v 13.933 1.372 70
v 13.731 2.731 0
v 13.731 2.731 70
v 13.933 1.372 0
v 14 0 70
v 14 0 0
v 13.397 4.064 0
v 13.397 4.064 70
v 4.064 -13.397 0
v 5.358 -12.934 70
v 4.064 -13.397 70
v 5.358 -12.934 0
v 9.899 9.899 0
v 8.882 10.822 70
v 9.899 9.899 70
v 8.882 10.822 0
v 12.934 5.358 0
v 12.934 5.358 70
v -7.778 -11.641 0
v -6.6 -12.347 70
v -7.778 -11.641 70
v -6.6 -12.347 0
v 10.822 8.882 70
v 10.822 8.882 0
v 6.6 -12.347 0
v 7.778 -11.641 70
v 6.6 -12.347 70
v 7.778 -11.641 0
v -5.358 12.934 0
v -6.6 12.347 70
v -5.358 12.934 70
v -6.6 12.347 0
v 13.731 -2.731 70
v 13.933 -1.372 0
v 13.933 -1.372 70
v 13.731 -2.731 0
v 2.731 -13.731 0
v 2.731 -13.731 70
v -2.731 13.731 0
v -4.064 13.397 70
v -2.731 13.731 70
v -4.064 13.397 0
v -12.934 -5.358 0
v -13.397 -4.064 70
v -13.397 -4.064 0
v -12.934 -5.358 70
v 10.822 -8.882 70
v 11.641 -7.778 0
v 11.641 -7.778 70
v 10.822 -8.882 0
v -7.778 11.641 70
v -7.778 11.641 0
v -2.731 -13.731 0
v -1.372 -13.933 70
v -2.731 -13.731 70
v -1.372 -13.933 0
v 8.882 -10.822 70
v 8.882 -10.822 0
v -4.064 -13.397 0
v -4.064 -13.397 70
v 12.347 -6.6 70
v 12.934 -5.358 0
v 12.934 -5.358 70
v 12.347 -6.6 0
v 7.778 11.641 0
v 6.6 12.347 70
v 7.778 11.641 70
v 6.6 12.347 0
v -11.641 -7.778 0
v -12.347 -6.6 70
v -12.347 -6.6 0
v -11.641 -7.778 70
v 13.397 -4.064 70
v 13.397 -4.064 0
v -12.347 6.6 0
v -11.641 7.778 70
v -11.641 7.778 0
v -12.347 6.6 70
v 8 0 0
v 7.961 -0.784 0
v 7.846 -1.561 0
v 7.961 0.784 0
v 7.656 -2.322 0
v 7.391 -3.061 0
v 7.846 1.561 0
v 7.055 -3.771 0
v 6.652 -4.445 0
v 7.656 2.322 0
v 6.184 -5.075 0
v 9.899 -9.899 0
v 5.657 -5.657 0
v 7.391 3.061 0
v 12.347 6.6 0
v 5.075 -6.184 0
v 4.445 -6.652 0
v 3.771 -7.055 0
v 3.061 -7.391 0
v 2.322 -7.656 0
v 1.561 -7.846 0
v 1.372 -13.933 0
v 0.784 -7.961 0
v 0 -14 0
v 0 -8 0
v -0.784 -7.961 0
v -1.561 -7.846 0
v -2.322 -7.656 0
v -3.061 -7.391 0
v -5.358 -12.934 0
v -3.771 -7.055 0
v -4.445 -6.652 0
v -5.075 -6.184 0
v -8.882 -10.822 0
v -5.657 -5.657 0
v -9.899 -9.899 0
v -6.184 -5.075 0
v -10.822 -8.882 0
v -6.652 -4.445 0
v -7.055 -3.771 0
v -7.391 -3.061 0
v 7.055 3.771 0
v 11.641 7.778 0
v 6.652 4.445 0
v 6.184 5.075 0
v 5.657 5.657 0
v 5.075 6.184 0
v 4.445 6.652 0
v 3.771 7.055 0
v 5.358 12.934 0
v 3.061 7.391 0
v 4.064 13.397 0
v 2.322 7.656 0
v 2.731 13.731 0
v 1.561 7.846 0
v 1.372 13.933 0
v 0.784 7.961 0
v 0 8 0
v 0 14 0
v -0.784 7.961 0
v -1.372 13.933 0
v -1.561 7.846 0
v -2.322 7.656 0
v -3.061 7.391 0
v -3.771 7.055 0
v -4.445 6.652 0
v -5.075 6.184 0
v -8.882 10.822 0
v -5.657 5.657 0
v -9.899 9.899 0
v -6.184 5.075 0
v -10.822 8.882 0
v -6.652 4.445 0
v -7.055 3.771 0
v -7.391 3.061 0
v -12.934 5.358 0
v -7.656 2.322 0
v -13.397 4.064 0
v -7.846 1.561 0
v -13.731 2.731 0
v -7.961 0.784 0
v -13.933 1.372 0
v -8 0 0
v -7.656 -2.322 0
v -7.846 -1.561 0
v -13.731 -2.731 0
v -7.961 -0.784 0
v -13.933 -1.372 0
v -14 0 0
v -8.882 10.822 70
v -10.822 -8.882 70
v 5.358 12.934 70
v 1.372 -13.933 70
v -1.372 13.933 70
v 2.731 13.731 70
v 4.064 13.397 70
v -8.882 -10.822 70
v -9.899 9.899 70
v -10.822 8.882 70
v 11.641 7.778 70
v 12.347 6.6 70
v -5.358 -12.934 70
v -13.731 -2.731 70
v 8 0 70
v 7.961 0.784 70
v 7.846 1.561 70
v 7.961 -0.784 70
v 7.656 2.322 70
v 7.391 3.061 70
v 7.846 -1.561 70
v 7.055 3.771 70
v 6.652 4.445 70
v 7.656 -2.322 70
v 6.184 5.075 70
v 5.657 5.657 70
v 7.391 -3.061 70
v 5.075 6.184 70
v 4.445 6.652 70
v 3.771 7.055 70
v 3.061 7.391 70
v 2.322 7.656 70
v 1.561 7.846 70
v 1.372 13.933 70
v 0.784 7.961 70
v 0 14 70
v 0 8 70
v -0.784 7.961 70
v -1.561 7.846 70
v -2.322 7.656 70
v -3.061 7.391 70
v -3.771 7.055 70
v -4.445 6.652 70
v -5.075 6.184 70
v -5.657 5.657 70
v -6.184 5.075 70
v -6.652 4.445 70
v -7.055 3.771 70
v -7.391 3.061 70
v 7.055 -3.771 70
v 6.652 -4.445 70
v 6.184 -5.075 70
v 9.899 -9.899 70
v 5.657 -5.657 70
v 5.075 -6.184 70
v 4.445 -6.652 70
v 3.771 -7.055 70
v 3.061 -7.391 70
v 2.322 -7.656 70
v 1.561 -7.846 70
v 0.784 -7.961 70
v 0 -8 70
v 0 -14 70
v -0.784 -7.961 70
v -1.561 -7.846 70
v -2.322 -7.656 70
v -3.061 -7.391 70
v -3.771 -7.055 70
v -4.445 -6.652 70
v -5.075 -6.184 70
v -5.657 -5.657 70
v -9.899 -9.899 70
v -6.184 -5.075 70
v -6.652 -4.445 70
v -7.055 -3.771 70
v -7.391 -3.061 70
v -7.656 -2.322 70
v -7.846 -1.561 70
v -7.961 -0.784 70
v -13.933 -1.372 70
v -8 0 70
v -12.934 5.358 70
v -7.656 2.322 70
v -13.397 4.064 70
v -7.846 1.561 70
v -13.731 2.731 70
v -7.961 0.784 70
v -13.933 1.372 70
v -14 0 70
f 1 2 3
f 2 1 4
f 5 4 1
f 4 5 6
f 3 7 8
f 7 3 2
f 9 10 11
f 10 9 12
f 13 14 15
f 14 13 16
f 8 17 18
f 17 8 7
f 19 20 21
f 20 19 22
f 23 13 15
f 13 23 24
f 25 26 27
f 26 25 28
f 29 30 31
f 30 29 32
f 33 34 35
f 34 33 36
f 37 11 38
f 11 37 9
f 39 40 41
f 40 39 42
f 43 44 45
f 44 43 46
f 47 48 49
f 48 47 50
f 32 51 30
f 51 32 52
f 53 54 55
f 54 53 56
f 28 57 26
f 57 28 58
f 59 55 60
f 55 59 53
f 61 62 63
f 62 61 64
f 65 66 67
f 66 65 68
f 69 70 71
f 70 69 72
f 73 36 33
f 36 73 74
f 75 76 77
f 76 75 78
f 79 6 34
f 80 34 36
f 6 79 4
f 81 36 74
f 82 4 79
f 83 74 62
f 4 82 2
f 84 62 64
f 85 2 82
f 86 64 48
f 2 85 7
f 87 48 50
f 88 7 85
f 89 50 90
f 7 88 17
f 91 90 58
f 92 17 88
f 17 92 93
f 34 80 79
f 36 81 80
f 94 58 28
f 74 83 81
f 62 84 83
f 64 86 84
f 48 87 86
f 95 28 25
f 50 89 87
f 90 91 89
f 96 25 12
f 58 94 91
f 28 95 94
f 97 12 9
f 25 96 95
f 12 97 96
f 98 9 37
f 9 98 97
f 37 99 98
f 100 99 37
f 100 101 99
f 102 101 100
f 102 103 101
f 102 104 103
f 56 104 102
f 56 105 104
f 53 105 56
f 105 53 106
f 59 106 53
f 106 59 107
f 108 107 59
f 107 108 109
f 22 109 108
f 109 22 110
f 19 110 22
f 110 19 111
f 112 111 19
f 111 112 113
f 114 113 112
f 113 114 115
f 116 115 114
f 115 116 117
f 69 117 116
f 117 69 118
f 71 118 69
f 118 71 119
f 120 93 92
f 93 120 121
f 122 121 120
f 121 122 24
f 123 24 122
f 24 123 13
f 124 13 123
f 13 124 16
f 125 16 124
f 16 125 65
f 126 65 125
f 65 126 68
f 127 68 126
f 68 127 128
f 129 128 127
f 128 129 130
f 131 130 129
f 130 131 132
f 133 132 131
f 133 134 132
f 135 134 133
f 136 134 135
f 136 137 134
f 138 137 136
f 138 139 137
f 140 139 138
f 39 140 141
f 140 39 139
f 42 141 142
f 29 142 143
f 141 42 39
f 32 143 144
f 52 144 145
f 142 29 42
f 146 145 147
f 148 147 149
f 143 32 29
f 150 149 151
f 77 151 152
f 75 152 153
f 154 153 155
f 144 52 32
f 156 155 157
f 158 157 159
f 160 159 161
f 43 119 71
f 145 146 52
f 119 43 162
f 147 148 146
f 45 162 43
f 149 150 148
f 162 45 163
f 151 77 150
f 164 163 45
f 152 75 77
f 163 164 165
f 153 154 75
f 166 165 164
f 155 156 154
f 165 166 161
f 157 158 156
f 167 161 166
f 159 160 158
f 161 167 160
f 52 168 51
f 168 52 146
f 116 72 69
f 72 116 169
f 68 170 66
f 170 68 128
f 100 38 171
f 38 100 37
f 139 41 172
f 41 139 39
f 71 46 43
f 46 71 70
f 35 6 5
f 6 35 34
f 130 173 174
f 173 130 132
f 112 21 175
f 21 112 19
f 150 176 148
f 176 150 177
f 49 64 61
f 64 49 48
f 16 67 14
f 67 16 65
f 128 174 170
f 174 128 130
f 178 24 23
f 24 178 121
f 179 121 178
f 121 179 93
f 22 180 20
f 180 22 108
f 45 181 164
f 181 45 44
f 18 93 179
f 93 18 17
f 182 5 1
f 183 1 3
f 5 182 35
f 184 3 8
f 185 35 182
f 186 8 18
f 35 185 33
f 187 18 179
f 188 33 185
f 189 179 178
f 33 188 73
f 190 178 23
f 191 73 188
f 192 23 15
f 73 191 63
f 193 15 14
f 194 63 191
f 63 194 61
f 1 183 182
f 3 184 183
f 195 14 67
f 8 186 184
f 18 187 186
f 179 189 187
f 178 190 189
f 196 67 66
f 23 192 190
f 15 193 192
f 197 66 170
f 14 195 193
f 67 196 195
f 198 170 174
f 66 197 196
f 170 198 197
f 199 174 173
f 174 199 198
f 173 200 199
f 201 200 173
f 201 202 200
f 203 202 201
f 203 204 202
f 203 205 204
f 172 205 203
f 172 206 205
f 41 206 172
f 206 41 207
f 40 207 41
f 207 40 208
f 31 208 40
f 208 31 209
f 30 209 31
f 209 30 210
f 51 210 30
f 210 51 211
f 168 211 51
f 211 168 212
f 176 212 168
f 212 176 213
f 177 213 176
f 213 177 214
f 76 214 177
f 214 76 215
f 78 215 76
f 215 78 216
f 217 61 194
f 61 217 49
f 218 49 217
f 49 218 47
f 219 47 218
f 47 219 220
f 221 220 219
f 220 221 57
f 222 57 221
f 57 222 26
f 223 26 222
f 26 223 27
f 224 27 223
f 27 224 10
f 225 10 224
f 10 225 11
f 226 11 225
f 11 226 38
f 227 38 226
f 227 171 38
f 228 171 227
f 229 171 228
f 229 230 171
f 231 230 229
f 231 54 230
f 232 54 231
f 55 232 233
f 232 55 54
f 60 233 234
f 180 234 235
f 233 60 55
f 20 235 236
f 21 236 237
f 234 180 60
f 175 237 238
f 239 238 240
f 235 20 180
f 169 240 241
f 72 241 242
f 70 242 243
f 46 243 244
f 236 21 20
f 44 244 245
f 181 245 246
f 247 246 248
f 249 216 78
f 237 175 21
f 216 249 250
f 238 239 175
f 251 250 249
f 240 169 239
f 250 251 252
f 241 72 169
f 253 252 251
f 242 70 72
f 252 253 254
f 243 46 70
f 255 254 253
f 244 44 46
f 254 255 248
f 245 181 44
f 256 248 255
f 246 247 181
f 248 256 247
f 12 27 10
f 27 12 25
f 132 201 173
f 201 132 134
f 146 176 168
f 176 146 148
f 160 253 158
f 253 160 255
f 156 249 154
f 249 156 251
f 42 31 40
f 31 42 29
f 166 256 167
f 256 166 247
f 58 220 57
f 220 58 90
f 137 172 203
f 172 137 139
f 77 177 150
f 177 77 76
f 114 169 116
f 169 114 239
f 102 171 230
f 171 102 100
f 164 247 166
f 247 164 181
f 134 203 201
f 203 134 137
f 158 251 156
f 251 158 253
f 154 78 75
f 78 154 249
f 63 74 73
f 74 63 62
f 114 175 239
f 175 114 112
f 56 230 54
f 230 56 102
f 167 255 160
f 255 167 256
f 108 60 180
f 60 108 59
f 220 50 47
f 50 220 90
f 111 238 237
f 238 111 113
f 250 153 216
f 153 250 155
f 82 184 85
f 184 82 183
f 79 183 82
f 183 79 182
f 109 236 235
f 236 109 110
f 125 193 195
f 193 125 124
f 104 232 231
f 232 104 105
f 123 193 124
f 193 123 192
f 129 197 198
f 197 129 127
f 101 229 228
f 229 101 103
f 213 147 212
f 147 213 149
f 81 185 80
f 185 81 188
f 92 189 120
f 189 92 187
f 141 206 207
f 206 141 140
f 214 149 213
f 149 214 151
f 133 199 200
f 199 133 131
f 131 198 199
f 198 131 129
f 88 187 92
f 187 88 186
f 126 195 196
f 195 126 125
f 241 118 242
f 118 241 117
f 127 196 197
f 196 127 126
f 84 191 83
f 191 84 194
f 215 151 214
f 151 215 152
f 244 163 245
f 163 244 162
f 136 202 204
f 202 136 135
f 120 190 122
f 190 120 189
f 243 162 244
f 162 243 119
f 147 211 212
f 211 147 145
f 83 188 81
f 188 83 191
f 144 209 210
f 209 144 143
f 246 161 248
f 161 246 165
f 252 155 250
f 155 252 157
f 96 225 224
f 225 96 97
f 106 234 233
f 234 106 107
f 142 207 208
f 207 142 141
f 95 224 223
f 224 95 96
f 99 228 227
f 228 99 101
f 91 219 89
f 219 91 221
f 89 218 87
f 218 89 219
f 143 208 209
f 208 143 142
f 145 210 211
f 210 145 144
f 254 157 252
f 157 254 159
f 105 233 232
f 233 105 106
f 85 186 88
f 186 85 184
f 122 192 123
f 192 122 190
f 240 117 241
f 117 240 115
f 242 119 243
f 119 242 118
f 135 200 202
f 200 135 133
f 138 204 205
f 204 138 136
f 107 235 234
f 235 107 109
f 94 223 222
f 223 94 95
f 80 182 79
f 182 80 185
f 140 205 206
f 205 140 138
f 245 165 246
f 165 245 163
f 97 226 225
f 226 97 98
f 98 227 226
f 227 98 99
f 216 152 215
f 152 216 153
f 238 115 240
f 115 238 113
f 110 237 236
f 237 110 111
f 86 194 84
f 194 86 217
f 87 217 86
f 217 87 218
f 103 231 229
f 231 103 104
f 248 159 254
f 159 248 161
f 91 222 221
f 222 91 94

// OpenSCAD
difference() {
    cylinder(h=70.0, d=28.0, $fn=64);
    translate([0, 0, -1])
        cylinder(h=72.0, d=16.0, $fn=64);
}
